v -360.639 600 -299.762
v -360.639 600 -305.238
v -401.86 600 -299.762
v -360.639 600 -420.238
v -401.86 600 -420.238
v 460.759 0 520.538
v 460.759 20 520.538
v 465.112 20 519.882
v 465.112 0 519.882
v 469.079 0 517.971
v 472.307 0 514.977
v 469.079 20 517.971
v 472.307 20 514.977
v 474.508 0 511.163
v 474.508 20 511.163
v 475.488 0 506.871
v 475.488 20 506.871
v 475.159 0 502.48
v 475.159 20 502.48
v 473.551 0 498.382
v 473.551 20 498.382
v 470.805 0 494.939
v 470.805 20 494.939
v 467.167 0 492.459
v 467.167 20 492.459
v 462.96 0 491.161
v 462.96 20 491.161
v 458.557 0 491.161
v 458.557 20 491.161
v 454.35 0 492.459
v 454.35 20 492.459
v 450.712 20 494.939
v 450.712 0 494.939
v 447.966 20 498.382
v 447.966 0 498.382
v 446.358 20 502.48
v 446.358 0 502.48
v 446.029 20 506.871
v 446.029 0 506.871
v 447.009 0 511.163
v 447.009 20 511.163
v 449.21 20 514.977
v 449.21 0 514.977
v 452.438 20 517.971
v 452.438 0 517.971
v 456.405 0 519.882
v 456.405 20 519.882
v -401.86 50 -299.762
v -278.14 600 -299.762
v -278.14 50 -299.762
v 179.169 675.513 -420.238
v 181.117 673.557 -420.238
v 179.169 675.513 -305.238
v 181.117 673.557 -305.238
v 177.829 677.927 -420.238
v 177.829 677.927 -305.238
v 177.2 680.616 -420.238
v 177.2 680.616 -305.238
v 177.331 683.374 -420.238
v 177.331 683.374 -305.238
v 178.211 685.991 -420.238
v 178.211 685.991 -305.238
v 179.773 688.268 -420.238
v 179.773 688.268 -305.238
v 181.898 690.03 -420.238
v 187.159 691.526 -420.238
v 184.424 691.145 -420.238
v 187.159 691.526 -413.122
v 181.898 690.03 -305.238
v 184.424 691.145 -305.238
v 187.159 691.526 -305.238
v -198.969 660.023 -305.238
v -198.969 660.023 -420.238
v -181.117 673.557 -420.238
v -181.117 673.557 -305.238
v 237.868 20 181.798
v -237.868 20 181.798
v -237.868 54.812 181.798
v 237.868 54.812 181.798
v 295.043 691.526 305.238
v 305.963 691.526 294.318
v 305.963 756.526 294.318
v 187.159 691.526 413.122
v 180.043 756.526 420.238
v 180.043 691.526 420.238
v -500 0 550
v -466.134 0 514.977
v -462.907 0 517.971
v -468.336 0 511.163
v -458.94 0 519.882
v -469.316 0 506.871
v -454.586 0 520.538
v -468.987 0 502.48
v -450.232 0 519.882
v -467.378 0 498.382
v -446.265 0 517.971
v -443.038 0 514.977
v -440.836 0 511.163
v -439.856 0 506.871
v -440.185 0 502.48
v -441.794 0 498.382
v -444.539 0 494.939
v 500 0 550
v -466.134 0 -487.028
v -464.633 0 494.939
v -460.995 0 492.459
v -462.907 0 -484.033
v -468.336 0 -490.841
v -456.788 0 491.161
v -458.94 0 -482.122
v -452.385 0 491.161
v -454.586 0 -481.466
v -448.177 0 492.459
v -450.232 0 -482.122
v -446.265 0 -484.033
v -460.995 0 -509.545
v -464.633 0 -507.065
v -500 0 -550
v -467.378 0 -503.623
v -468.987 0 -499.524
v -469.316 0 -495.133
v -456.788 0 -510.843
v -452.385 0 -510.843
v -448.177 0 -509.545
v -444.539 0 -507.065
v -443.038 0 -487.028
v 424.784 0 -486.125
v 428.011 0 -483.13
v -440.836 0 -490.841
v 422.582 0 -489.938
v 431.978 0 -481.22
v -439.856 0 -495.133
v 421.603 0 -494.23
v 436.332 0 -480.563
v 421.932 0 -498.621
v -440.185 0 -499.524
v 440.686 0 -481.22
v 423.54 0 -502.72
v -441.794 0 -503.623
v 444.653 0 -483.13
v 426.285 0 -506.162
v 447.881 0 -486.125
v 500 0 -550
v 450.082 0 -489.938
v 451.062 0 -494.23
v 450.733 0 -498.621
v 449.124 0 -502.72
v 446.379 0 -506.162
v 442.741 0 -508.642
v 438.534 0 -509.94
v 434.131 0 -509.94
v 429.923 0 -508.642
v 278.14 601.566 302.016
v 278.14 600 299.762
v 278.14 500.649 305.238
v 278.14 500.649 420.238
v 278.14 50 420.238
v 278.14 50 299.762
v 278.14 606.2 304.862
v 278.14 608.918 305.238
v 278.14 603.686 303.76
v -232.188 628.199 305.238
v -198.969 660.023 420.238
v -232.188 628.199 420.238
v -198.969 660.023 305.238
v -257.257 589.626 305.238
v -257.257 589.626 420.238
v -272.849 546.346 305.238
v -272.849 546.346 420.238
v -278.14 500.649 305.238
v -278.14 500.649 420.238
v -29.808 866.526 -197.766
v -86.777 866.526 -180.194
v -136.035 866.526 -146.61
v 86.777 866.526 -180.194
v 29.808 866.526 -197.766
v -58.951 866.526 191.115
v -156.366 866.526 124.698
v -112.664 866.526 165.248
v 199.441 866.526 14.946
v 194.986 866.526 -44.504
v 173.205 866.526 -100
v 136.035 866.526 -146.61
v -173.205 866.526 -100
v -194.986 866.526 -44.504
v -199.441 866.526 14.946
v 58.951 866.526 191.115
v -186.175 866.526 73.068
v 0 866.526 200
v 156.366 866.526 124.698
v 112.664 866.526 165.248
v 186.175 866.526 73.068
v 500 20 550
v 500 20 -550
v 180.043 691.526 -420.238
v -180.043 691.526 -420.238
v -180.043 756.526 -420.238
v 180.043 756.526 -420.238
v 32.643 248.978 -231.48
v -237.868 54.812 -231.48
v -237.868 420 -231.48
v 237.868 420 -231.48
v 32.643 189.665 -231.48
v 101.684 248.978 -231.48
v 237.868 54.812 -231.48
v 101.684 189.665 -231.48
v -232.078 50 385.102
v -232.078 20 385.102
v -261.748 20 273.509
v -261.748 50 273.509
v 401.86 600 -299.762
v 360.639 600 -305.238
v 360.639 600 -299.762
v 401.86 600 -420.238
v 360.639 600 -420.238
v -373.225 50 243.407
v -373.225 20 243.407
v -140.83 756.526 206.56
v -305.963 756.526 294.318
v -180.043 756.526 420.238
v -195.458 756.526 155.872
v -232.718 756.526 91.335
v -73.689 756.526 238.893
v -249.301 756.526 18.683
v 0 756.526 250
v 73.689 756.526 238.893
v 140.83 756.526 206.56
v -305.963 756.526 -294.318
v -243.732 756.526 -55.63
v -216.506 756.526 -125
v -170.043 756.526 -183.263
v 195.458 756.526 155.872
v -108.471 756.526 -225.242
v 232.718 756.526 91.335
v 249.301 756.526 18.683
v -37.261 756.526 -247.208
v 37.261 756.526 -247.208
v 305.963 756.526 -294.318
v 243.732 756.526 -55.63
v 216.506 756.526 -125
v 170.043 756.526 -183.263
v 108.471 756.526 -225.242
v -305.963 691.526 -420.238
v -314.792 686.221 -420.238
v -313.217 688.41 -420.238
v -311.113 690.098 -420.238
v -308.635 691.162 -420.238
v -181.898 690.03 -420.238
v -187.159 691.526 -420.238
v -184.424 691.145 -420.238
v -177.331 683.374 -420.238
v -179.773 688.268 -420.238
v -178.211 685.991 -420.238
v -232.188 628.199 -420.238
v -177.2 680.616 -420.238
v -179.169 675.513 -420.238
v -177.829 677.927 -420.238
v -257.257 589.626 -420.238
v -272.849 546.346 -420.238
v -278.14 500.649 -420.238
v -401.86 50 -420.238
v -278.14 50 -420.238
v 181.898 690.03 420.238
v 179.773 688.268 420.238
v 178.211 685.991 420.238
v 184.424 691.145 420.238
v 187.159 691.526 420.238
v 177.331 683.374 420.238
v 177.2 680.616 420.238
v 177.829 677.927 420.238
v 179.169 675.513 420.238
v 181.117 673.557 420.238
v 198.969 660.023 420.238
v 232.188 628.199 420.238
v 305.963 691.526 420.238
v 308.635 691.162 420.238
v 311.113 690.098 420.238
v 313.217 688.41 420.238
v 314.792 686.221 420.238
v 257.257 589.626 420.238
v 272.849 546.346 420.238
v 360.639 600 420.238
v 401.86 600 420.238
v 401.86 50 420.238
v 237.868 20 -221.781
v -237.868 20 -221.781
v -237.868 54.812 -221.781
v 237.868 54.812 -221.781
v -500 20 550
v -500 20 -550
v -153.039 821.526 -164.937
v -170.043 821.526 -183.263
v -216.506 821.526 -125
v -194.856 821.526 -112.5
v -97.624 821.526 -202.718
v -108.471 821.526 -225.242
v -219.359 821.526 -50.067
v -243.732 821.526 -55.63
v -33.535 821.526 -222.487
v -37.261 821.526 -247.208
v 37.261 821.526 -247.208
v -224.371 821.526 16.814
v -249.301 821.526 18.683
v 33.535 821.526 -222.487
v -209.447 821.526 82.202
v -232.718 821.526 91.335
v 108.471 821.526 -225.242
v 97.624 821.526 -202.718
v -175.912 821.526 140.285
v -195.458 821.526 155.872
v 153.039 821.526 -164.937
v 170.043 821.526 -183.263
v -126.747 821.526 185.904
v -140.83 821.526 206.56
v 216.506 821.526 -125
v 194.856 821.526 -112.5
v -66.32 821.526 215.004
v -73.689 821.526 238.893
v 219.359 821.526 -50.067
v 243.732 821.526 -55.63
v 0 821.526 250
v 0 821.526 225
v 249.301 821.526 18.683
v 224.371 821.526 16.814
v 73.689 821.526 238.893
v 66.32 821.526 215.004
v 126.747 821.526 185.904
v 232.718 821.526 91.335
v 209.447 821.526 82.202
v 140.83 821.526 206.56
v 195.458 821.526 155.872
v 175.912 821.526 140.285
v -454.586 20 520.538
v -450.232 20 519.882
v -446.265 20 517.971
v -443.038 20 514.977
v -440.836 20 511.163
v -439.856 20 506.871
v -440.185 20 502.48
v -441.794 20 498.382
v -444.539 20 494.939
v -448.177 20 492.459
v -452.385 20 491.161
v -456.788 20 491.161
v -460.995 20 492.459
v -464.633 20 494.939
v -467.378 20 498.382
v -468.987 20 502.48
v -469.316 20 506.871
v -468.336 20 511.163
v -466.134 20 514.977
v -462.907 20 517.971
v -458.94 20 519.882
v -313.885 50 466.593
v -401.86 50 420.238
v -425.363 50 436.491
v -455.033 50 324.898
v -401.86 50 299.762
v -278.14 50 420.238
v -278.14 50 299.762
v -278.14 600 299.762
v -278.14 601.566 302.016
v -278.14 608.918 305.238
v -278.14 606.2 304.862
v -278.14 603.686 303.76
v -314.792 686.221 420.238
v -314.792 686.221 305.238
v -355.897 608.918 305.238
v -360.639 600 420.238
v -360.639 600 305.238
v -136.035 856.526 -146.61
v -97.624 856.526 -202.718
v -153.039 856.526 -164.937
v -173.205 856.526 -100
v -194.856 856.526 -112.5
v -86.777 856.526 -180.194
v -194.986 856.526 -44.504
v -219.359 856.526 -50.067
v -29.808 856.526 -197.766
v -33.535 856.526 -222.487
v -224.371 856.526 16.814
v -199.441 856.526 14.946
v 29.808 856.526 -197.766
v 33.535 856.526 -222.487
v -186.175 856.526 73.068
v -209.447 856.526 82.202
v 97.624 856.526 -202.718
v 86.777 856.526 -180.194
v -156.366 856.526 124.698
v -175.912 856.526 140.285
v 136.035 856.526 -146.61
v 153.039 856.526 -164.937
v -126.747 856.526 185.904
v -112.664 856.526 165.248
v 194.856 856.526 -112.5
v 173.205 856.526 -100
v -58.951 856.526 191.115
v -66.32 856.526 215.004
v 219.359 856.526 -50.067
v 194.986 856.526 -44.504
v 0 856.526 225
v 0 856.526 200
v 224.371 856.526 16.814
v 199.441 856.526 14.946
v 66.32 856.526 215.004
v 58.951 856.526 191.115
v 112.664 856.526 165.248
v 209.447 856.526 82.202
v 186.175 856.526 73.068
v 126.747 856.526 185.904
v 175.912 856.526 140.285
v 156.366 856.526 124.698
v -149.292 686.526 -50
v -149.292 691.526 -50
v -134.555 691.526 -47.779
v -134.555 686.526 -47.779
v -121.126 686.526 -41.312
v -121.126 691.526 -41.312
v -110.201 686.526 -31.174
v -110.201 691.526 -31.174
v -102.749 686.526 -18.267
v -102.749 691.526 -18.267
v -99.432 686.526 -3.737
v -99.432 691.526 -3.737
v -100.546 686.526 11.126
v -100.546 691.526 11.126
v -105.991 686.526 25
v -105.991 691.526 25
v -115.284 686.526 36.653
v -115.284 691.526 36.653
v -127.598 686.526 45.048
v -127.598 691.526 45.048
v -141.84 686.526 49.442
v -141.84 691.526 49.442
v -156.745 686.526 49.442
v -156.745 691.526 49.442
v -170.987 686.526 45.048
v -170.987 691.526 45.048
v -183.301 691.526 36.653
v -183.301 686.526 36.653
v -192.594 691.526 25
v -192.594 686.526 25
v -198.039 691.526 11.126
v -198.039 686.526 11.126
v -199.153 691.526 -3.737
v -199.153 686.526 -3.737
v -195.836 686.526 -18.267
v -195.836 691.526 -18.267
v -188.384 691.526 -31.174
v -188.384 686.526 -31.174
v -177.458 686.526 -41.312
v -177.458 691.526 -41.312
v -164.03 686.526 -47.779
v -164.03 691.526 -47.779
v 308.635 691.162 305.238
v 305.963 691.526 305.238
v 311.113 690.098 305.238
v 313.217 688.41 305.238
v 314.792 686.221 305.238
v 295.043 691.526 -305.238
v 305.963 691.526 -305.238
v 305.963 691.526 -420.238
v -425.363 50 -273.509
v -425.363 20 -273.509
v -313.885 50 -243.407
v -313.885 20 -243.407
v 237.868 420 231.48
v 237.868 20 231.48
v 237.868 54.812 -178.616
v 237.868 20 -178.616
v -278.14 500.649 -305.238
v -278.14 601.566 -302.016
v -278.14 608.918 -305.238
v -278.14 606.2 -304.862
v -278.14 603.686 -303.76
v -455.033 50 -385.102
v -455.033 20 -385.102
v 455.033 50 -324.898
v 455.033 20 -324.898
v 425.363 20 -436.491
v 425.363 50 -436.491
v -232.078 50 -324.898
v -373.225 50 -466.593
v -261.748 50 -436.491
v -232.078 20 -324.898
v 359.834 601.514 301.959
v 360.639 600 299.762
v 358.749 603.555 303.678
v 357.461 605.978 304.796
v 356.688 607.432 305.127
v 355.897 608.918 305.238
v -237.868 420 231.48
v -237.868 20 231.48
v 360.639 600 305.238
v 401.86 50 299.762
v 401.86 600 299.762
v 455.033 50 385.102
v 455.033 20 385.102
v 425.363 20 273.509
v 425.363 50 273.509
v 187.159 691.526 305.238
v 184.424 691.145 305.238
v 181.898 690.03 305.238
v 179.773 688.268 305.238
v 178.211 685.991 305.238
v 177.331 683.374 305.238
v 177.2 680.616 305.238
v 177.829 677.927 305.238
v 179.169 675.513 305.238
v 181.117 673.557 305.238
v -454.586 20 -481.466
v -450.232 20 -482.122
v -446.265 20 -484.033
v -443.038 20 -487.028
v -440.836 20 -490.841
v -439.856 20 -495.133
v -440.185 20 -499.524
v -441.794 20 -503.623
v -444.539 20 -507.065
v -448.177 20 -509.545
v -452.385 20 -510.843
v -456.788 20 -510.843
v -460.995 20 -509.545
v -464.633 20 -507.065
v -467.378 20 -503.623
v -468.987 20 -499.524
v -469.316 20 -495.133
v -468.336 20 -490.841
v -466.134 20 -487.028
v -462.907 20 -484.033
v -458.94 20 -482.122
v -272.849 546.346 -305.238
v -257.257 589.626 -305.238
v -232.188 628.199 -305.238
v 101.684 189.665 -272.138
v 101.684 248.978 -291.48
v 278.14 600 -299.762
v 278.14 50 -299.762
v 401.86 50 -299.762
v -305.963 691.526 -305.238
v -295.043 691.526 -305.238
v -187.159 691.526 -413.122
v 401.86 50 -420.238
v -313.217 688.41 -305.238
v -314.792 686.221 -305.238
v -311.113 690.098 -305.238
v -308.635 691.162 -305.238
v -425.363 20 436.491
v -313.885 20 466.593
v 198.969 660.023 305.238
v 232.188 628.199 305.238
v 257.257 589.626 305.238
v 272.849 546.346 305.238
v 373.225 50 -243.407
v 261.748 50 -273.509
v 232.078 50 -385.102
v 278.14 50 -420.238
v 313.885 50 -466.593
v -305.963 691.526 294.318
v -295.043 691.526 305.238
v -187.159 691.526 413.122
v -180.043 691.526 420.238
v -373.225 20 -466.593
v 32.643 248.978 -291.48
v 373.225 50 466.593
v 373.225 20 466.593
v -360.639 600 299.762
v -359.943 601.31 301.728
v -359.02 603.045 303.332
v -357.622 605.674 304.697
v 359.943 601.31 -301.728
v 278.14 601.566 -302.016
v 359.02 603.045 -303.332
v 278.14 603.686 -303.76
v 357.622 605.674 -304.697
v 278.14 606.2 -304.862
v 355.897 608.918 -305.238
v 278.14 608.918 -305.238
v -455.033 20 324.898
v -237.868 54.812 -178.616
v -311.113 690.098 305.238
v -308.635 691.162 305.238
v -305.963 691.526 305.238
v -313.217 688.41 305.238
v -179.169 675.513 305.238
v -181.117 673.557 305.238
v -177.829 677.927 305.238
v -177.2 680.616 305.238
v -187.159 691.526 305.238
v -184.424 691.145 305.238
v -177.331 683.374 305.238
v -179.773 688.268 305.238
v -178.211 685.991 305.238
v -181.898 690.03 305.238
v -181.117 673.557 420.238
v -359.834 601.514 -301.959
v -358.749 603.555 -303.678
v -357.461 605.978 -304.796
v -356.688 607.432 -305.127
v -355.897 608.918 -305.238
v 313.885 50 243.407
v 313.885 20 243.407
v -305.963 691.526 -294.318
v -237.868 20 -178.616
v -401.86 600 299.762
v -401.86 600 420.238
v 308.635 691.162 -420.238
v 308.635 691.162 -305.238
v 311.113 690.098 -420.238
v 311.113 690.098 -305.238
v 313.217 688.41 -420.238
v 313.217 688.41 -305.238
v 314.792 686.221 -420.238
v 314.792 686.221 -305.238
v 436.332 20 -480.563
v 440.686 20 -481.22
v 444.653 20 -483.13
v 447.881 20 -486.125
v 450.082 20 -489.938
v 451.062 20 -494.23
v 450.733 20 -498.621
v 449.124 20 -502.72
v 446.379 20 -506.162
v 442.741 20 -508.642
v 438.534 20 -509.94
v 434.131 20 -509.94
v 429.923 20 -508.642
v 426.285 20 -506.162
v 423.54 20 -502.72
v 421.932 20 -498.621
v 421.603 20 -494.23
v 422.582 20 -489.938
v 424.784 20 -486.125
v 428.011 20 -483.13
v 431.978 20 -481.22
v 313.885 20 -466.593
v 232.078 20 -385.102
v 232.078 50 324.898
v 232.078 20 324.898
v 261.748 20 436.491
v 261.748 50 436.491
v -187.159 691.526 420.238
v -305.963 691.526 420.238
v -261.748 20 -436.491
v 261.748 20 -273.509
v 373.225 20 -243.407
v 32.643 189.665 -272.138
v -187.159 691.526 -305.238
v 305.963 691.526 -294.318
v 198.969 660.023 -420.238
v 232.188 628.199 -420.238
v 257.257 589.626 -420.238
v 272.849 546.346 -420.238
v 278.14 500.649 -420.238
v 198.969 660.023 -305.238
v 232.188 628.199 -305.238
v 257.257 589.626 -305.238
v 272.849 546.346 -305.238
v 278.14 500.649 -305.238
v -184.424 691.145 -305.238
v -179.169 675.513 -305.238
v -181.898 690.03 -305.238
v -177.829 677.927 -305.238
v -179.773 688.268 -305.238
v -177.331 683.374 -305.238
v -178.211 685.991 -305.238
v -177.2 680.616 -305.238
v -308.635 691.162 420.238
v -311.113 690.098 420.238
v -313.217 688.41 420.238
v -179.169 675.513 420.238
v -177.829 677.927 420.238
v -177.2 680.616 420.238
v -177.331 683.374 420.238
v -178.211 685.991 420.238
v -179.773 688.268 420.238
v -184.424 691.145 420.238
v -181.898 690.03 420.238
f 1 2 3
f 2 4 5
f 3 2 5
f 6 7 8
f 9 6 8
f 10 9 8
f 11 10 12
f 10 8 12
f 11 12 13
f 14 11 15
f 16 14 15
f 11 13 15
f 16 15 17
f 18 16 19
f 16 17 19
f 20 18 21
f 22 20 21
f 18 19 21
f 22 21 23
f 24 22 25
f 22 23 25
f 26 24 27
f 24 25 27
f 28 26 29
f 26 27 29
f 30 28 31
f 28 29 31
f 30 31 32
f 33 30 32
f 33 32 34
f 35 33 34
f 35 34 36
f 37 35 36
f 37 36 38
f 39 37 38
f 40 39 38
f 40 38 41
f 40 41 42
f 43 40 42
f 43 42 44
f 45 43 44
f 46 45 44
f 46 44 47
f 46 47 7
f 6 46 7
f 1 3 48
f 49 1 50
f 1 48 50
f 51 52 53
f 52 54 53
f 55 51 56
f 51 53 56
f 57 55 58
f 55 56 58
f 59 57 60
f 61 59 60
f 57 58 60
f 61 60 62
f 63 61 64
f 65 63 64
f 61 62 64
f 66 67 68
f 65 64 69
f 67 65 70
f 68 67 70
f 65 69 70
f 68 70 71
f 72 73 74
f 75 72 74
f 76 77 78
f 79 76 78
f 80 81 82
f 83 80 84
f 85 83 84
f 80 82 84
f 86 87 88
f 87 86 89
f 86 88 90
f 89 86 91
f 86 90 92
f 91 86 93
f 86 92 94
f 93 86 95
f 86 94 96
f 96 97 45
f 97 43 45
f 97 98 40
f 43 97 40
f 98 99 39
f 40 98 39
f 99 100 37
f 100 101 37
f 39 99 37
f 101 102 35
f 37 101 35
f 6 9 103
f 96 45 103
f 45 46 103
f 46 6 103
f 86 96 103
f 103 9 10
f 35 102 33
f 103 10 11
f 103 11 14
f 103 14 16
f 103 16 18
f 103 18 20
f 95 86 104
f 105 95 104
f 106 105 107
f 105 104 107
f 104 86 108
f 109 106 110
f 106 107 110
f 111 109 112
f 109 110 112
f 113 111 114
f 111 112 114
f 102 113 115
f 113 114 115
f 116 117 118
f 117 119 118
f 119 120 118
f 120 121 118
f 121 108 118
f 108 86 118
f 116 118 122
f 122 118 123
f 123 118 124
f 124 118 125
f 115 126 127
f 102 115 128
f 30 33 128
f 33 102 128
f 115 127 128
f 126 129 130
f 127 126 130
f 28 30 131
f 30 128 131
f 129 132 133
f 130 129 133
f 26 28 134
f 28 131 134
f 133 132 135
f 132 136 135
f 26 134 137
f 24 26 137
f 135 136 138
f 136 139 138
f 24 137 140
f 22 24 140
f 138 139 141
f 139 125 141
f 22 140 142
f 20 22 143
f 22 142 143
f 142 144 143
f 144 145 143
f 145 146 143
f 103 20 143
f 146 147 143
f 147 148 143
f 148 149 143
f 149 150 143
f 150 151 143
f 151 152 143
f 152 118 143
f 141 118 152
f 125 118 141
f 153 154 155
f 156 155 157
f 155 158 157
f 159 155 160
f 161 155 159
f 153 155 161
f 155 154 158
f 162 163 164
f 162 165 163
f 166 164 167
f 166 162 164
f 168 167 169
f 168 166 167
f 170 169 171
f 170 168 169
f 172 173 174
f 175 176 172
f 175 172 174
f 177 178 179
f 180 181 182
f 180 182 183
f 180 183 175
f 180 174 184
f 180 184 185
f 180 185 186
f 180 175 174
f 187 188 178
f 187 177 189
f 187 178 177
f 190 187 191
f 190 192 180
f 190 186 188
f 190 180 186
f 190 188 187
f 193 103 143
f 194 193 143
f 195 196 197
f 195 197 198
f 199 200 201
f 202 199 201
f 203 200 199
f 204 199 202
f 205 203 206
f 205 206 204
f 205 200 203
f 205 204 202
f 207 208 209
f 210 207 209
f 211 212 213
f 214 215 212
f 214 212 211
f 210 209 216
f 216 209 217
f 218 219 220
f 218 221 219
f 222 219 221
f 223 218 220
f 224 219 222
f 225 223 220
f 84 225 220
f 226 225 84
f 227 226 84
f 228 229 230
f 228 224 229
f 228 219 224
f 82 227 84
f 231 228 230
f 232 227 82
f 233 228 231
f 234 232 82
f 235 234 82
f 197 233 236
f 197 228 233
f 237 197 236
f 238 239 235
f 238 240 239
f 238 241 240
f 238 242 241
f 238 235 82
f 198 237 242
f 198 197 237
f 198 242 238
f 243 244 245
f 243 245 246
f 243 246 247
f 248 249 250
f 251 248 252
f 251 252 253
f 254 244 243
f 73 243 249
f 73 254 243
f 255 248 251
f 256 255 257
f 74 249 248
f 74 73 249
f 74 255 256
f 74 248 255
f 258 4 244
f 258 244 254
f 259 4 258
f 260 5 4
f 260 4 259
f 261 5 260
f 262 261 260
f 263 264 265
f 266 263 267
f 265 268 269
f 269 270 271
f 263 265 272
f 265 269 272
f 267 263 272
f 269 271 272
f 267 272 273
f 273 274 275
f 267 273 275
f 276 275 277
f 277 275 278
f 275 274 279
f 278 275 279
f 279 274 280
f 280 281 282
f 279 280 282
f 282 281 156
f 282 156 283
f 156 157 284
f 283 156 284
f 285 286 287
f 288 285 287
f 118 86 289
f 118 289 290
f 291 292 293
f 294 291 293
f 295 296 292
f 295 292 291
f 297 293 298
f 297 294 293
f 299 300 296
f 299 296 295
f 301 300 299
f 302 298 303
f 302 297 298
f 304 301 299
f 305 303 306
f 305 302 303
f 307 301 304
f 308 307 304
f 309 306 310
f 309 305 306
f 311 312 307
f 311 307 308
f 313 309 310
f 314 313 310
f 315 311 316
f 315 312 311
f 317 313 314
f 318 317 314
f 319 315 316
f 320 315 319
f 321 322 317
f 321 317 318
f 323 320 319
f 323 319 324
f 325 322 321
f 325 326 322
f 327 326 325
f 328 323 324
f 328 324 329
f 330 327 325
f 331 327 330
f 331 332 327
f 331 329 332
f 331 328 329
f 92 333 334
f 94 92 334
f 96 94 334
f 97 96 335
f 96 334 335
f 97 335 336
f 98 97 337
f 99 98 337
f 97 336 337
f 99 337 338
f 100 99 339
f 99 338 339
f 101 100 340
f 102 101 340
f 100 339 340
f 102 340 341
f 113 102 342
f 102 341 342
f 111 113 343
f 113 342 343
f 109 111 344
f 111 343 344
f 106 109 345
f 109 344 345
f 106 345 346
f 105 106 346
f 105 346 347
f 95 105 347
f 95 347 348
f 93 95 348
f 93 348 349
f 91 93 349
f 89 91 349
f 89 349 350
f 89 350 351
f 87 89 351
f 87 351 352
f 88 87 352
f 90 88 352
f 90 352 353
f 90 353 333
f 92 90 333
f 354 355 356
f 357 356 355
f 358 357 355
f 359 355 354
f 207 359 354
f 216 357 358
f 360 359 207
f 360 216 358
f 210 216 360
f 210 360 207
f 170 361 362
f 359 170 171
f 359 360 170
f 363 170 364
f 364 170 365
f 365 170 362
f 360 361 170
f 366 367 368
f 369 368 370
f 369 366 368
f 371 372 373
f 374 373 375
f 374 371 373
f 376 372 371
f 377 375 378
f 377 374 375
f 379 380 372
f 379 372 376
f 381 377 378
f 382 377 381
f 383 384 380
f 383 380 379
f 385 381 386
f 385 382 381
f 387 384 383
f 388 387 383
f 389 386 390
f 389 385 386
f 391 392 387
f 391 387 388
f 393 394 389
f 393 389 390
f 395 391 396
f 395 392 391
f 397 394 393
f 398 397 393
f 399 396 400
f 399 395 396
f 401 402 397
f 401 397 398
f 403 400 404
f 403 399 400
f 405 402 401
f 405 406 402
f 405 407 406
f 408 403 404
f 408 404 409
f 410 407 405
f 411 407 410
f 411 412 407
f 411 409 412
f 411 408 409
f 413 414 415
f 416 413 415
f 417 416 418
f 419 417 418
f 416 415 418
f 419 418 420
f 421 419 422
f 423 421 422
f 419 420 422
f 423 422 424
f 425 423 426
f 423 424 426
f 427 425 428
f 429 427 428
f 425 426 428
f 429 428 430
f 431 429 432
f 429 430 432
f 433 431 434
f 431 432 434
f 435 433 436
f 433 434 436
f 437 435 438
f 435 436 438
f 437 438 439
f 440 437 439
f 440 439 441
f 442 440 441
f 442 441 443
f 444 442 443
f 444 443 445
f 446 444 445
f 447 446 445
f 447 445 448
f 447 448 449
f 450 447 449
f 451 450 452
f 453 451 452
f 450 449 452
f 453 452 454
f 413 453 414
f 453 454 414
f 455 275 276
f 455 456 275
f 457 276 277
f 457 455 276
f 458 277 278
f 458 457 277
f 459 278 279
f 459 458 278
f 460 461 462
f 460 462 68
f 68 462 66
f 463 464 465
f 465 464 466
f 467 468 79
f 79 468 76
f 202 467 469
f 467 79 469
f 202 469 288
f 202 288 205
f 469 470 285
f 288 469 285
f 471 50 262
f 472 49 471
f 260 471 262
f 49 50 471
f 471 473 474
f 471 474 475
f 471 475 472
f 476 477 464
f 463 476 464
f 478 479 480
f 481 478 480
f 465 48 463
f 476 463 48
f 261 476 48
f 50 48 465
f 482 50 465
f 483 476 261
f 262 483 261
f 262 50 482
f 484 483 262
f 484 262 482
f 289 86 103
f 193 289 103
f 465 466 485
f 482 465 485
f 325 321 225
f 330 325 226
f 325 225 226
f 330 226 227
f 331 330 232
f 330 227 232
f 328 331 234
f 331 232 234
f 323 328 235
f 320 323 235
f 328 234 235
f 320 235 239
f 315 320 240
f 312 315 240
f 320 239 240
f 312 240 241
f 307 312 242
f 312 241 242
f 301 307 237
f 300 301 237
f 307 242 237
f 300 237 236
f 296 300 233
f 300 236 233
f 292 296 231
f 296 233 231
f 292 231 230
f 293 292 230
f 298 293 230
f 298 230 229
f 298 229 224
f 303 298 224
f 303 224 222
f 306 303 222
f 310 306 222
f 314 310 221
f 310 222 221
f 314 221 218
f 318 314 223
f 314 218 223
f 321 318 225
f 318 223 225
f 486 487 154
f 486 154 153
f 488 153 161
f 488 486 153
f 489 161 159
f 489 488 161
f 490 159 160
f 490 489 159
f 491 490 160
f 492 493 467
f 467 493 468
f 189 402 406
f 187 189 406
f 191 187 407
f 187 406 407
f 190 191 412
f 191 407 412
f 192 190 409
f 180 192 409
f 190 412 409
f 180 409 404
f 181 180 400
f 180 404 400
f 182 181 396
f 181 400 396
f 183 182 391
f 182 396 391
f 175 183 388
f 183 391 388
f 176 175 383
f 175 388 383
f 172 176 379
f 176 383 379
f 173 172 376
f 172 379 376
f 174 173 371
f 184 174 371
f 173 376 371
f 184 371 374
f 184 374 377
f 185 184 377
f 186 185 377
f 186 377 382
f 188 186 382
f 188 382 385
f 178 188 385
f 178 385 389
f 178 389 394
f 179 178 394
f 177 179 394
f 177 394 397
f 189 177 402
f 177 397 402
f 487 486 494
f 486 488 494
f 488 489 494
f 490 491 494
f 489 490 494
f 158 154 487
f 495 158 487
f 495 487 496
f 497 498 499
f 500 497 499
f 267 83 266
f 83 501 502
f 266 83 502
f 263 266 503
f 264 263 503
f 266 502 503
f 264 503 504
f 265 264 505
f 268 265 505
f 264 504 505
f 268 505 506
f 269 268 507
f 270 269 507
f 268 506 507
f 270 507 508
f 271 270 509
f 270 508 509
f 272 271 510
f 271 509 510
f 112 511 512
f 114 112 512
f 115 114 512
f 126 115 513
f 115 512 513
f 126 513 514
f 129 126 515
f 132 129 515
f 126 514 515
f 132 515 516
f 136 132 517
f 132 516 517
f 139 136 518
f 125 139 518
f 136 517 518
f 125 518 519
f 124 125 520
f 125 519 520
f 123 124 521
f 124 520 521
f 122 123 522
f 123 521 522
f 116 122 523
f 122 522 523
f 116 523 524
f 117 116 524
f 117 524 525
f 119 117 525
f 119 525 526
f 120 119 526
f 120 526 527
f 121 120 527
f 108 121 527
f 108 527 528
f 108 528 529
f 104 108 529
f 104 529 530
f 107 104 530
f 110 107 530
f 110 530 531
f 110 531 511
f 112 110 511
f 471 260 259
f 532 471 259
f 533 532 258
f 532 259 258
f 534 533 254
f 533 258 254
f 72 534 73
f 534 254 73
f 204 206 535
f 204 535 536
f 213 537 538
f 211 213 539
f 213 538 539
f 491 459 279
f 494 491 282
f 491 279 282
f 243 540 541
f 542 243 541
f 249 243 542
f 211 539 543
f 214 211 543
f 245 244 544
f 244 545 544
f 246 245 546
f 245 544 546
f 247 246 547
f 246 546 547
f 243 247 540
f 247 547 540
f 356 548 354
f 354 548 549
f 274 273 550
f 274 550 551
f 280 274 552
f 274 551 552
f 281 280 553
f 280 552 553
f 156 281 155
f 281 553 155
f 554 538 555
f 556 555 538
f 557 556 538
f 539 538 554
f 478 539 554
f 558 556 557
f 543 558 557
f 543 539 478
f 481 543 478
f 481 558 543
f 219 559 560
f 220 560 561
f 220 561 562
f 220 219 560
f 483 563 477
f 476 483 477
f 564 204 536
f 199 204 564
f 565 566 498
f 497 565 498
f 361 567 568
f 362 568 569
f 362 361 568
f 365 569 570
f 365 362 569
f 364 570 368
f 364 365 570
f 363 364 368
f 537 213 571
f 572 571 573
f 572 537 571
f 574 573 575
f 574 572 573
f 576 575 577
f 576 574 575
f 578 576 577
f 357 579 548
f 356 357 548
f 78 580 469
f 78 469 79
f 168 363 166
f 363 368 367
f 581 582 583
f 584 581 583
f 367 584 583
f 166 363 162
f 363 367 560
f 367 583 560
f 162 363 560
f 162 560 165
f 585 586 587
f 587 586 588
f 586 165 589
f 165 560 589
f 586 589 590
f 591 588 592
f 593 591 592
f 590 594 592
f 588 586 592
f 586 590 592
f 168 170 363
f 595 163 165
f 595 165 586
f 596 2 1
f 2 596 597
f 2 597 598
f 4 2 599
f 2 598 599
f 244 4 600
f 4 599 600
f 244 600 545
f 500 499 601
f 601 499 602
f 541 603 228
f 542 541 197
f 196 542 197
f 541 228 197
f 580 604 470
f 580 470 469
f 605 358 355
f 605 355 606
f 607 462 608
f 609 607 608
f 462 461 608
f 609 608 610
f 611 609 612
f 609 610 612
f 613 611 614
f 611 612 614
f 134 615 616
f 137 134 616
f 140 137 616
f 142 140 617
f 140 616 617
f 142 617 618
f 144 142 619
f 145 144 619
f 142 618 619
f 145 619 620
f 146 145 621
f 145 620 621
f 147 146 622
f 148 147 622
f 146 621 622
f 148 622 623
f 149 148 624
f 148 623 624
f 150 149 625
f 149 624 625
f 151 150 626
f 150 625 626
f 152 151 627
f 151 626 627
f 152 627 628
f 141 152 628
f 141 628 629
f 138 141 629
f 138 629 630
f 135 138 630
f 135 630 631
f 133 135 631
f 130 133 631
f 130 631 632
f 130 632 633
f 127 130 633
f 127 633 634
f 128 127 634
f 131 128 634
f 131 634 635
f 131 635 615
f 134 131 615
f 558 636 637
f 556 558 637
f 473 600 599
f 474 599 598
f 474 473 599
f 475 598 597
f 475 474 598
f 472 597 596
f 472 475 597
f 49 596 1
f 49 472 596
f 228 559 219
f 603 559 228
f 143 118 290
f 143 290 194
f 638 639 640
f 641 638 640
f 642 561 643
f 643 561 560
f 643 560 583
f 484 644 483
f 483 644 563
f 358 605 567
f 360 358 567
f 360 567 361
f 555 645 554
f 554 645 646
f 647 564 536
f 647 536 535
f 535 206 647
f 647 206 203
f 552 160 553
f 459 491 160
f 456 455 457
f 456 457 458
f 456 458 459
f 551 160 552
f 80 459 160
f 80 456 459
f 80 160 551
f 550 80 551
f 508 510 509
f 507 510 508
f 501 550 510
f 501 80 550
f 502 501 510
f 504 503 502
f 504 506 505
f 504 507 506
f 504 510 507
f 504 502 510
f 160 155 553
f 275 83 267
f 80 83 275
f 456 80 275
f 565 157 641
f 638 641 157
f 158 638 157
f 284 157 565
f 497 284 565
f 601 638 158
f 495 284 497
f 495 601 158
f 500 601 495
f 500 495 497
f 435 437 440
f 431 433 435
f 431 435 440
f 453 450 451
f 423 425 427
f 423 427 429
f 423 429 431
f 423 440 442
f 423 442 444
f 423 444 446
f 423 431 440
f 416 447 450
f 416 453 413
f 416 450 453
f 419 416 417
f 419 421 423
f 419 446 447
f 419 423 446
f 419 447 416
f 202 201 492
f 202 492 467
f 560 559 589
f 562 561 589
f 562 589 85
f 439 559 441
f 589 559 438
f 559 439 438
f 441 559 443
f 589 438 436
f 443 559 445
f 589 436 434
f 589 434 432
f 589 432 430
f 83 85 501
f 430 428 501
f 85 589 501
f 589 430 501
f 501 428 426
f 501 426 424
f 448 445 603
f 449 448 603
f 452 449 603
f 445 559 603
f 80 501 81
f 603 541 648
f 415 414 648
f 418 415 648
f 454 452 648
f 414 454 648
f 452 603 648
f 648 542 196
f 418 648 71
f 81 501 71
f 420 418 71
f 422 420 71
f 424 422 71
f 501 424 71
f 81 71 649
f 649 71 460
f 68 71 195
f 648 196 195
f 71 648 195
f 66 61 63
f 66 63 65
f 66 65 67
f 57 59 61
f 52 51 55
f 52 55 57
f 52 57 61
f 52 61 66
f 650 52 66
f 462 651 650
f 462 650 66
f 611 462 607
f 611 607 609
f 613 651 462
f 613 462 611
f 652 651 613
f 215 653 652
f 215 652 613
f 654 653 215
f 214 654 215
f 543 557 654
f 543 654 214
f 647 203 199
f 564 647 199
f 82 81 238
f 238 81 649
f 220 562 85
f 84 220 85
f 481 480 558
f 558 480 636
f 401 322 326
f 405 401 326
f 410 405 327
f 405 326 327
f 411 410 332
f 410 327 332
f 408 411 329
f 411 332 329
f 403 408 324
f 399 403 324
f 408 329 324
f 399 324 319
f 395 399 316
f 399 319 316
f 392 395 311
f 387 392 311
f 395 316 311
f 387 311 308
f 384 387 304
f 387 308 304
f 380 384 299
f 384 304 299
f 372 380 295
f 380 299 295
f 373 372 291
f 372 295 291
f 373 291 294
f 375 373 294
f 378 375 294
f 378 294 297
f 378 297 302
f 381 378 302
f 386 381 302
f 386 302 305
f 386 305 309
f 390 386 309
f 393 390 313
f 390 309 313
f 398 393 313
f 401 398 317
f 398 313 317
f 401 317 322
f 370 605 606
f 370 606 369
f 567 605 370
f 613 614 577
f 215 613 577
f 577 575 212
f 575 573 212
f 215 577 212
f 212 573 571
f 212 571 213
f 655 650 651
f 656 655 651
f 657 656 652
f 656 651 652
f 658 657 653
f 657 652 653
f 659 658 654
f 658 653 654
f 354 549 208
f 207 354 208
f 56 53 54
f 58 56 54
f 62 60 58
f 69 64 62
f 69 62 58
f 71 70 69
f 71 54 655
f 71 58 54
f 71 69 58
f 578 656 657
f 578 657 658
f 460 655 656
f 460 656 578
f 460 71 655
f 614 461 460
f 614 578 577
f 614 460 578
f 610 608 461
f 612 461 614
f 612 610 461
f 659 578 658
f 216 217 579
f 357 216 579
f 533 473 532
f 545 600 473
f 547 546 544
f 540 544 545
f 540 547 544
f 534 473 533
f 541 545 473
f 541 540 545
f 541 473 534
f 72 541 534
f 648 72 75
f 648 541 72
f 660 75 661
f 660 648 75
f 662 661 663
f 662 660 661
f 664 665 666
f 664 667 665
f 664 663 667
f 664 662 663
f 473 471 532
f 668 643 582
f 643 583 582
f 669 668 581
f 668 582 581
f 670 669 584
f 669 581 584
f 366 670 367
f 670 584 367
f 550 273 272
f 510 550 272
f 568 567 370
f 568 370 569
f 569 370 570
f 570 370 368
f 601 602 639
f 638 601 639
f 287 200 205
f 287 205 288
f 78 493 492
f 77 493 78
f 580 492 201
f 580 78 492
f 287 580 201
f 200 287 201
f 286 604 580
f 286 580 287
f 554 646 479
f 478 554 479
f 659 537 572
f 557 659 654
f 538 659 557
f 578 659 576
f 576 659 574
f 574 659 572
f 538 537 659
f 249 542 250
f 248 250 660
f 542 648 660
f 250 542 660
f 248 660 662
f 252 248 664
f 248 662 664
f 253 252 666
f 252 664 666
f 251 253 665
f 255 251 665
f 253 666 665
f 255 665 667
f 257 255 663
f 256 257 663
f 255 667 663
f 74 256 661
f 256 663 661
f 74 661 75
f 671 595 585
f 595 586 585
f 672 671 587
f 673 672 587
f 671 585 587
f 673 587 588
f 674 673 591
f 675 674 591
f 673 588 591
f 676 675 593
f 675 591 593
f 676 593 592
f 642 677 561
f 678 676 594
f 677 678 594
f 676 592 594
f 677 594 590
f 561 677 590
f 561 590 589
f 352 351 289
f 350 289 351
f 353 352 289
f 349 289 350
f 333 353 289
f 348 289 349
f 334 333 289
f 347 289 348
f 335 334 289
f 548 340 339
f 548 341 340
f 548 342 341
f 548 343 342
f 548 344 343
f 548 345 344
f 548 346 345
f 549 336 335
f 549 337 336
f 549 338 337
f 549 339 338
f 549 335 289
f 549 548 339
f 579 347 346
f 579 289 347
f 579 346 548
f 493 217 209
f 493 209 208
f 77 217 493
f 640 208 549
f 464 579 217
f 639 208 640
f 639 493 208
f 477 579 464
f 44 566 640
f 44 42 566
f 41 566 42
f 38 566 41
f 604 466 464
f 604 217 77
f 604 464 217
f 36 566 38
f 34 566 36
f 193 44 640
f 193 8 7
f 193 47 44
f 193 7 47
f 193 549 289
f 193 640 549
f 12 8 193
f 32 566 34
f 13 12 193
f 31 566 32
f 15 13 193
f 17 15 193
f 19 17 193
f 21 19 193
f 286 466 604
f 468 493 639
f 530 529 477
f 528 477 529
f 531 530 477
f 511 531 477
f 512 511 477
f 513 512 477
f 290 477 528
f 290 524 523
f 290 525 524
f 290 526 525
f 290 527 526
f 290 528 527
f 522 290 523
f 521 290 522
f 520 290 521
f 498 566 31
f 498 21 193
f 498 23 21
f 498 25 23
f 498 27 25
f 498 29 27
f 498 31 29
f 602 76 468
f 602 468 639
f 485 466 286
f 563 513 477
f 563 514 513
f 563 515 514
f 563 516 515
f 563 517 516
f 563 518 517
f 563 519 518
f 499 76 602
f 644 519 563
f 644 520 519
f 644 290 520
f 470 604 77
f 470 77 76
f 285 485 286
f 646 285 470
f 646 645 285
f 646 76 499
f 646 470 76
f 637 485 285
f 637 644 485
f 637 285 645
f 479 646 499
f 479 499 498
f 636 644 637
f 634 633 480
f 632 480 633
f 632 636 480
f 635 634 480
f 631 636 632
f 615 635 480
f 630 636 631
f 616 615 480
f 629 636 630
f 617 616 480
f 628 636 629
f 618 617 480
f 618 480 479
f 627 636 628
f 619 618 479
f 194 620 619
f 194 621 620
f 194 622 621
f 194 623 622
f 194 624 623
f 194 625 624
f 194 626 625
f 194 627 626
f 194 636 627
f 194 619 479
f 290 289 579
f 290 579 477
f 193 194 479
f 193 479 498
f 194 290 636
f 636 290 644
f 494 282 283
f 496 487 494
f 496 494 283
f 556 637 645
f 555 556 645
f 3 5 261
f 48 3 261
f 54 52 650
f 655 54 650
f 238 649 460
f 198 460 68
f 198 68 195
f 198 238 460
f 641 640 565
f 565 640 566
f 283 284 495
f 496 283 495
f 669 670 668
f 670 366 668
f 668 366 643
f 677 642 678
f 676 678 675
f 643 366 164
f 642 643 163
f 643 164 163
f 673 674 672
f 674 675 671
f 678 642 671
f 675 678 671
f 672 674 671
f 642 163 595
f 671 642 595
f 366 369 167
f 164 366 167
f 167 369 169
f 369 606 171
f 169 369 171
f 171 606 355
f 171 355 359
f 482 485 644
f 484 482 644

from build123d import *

# Parameters (mm, degrees)
SKETCH2_W            = 1000
SKETCH2_H            = 1100
BOSS_EXTRUDE1_DEPTH  = 20
BOSS_EXTRUDE2_DEPTH  = 30
SKETCH4_W            = 475.735232804
SKETCH4_H            = 462.959293972
BOSS_EXTRUDE3_DEPTH  = 400
SKETCH5_W            = 9.698613805
SKETCH5_H            = 34.812032077
CUT_EXTRUDE1_DEPTH   = 1012.606949035
SKETCH6_W            = 360.413866027
SKETCH6_H            = 34.812032077
CUT_EXTRUDE2_DEPTH   = 1012.606949035
SKETCH7_W            = 115
SKETCH7_H            = 115
BOSS_EXTRUDE4_DEPTH  = 550
BOSS_EXTRUDE6_DEPTH  = 115
FILLET3_R            = 200
FILLET5_R            = 10
FILLET6_R            = 10
FILLET3_OF_MIRROR2_R = 200
MIRROR3_START        = -420.238334409
MIRROR3_DEPTH        = 115
MIRROR3_START_2      = 299.761665591
MIRROR3_2_OUTLINE_W  = 123.720887542
MIRROR3_2_OUTLINE_H  = 550
MIRROR3_2_DEPTH      = 5.476668818
FILLET9_R            = 10
FILLET11_R           = 10
FILLET13_R           = 10
FILLET15_R           = 10
FILLET16_R           = 10
SKETCH9_W            = 611.925919606
SKETCH9_H            = 840.476668818
BOSS_EXTRUDE7_DEPTH  = 65
CUT_EXTRUDE3_DEPTH   = 65
SKETCH13_R           = 250
BOSS_EXTRUDE8_DEPTH  = 65
SKETCH14_R           = 225
BOSS_EXTRUDE9_DEPTH  = 35
SKETCH15_R           = 200
BOSS_EXTRUDE10_DEPTH = 10
SKETCH16_R           = 50
BOSS_EXTRUDE11_DEPTH = 5
SKETCH17_W           = 69.041025083
SKETCH17_H           = 59.313575352
BOSS_EXTRUDE12_DEPTH = 60
CUT_EXTRUDE4_DEPTH   = 90
SKETCH19_R           = 14.770979528
CUT_EXTRUDE5_DEPTH   = 90


# Read off the part's stored shape, not the designer's step: Mirror3
with BuildPart() as part:
    # Sketch2 → Boss-Extrude1 (new body)
    with BuildSketch(Plane(origin=(0, 0, 0), x_dir=(1, 0, 0), z_dir=(0, 1, 0))):
        Rectangle(SKETCH2_W, SKETCH2_H)
    extrude(amount=BOSS_EXTRUDE1_DEPTH)

    # Sketch3 → Boss-Extrude2 (add)
    with BuildSketch(Plane(origin=(0, 20, 0), x_dir=(1, 0, 0), z_dir=(0, 1, 0))):
        Polygon((-232.077673929, 324.898305528), (-261.747565619, 436.491454334), (-373.225013219, 466.593148806), (-455.032569128, 385.101694472), (-425.362677437, 273.508545666), (-313.885229838, 243.406851194), align=None)
        Polygon((-455.032569128, -324.898305528), (-425.362677437, -436.491454334), (-313.885229838, -466.593148806), (-232.077673929, -385.101694472), (-261.747565619, -273.508545666), (-373.225013219, -243.406851194), align=None)
        Polygon((261.747565619, -436.491454334), (373.225013219, -466.593148806), (455.032569128, -385.101694472), (425.362677437, -273.508545666), (313.885229838, -243.406851194), (232.077673929, -324.898305528), align=None)
        Polygon((261.747565619, 273.508545666), (373.225013219, 243.406851194), (455.032569128, 324.898305528), (425.362677437, 436.491454334), (313.885229838, 466.593148806), (232.077673929, 385.101694472), align=None)
    extrude(amount=BOSS_EXTRUDE2_DEPTH)

    # Sketch4 → Boss-Extrude3 (add)
    with BuildSketch(Plane(origin=(0, 20, 0), x_dir=(1, 0, 0), z_dir=(0, 1, 0))):
        Rectangle(SKETCH4_W, SKETCH4_H)
    extrude(amount=BOSS_EXTRUDE3_DEPTH)

    # Sketch5 → Cut-Extrude1 (cut, through all)
    with BuildSketch(Plane.ZY.offset(237.867616402)):
        with Locations((-226.630340084, 37.406016038)):
            Rectangle(SKETCH5_W, SKETCH5_H)
    extrude(amount=-CUT_EXTRUDE1_DEPTH, mode=Mode.SUBTRACT)

    # Sketch6 → Cut-Extrude2 (cut, through all)
    with BuildSketch(Plane.ZY.offset(237.867616402)):
        with Locations((1.590947851, 37.406016038)):
            Rectangle(SKETCH6_W, SKETCH6_H)
    extrude(amount=-CUT_EXTRUDE2_DEPTH, mode=Mode.SUBTRACT)

    # Sketch7 → Boss-Extrude4 (add)
    with BuildSketch(Plane(origin=(0, 50, 0), x_dir=(1, 0, 0), z_dir=(0, 1, 0))):
        with Locations((-335.639556229, 357.261665591)):
            Rectangle(SKETCH7_W, SKETCH7_H)
        with Locations((344.360443771, 357.261665591)):
            Rectangle(SKETCH7_W, SKETCH7_H)
        with Locations((-335.639556229, -362.738334409)):
            Rectangle(SKETCH7_W, SKETCH7_H)
        with Locations((344.360443771, -362.738334409)):
            Rectangle(SKETCH7_W, SKETCH7_H)
    boss_extrude4 = extrude(amount=BOSS_EXTRUDE4_DEPTH)

    # Sketch8 → Boss-Extrude6 (add)
    with BuildSketch(Plane.XY.offset(420.238334409)):
        Polygon((-311.971408496, 691.526051238), (-360.639390354, 600), (-278.139556229, 600), (-157.416765755, 691.526051238), align=None)
    boss_extrude6 = extrude(amount=-BOSS_EXTRUDE6_DEPTH)

    # Fillet3
    fillet3_edges = [part.edges().sort_by_distance(p)[0] for p in [
        (-278.139556229, 600, 362.738334409),
    ]]
    fillet(fillet3_edges, radius=FILLET3_R)

    # Fillet5
    fillet5_edges = [part.edges().sort_by_distance(p)[0] for p in [
        (-157.416765755, 691.526051238, 362.738334409),
    ]]
    fillet(fillet5_edges, radius=FILLET5_R)

    # Fillet6
    fillet6_edges = [part.edges().sort_by_distance(p)[0] for p in [
        (-311.971408496, 691.526051238, 362.738334409),
    ]]
    fillet(fillet6_edges, radius=FILLET6_R)

    # Mirror2: Boss-Extrude4, Boss-Extrude6 across plane
    add(boss_extrude4.mirror(Plane(origin=(0, 0, 0), x_dir=(0, 0, 1), z_dir=(1, 0, 0))))
    add(boss_extrude6.mirror(Plane(origin=(0, 0, 0), x_dir=(0, 0, 1), z_dir=(1, 0, 0))))

    # Fillet3 of Mirror2
    fillet3_of_mirror2_edges = [part.edges().sort_by_distance(p)[0] for p in [
        (278.139556229, 600, 362.738334409),
    ]]
    fillet(fillet3_of_mirror2_edges, radius=FILLET3_OF_MIRROR2_R)

    # Mirror3 outline → Mirror3 (add)
    with BuildSketch(Plane.XY.offset(MIRROR3_START)):
        with BuildLine():
            Line((-278.139556229, 50), (-278.139556229, 500.648656801))
            ThreePointArc((-278.139556229, 500.648656801), (-257.256761918, 589.626331677), (-198.969289966, 660.022981726))
            Line((-198.969289966, 660.022981726), (-157.416765755, 691.526051238))
            Line((-157.416765755, 691.526051238), (-311.971408496, 691.526051238))
            Line((-311.971408496, 691.526051238), (-360.639390354, 600))
            Line((-360.639390354, 600), (-401.860443771, 600))
            Line((-401.860443771, 600), (-401.860443771, 50))
            Line((-401.860443771, 50), (-278.139556229, 50))
        make_face()
        with BuildLine():
            Line((401.860443771, 50), (401.860443771, 600))
            Line((401.860443771, 600), (360.639390354, 600))
            Line((360.639390354, 600), (311.971408496, 691.526051238))
            Line((311.971408496, 691.526051238), (157.416765755, 691.526051238))
            Line((157.416765755, 691.526051238), (198.969289966, 660.022981726))
            ThreePointArc((198.969289966, 660.022981726), (257.256761918, 589.626331677), (278.139556229, 500.648656801))
            Line((278.139556229, 500.648656801), (278.139556229, 50))
            Line((278.139556229, 50), (401.860443771, 50))
        make_face()
    extrude(amount=MIRROR3_DEPTH)

    # Mirror3 2 outline → Mirror3 2 (add)
    with BuildSketch(Plane.XY.offset(MIRROR3_START_2)):
        with Locations((-340, 325)):
            Rectangle(MIRROR3_2_OUTLINE_W, MIRROR3_2_OUTLINE_H)
        with Locations((340, 325)):
            Rectangle(MIRROR3_2_OUTLINE_W, MIRROR3_2_OUTLINE_H)
    extrude(amount=MIRROR3_2_DEPTH)

    # Fillet9
    # the kernel refuses this fillet: 10 mm, written as the material it adds along each edge
    with BuildSketch(Plane(origin=(-278.139556229, 600, -305.238334409), x_dir=(0, 0, 1), z_dir=(-1, 0, 0))) as fillet9_piece_1_section:
        with BuildLine():
            CenterArc((10, 8.918490625), FILLET9_R, 180, 63.10652679)
            Line((0, 8.918490625), (-0.2, 8.918490625))
            Line((-0.2, 8.918490625), (-0.2, 0))
            Line((-0.2, 0), (0, -0.2))
            ThreePointArc((0, -0.2), (2.738334409, -0.2), (5.386202195, -0.178369812))
            Line((5.386202195, -0.178369812), (5.476668818, 0))
        make_face()
    fillet9_piece_1 = extrude(amount=104.796060686, mode=Mode.PRIVATE)
    fillet9_piece_1 = split(fillet9_piece_1, bisect_by=Plane(origin=(-350.518364197, 619.033819017, -303.80875695), z_dir=(0.882936727210202, -0.46949199752853876, 0)), keep=Keep.TOP, mode=Mode.PRIVATE)
    add(fillet9_piece_1)

    # Fillet11
    # the kernel refuses this fillet: 10 mm, written as the material it adds along each edge
    with BuildSketch(Plane(origin=(-278.139556229, 600, 305.238334409), x_dir=(0, 0, -1), z_dir=(-1, 0, 0))) as fillet11_piece_1_section:
        with BuildLine():
            CenterArc((10, -8.918490625), FILLET11_R, 116.89347321, 63.10652679)
            Line((0, -8.918490625), (-0.2, -8.918490625))
            Line((-0.2, -8.918490625), (-0.2, 0))
            Line((-0.2, 0), (0, 0.2))
            ThreePointArc((0, 0.2), (2.738334409, 0.2), (5.386202194, 0.178369812))
            Line((5.386202194, 0.178369812), (5.476668818, 0))
        make_face()
    fillet11_piece_1 = extrude(amount=104.796060686, mode=Mode.PRIVATE)
    fillet11_piece_1 = split(fillet11_piece_1, bisect_by=Plane(origin=(-350.518364197, 619.033819017, 303.80875695), z_dir=(0.8829367272129939, -0.4694919975232882, 0)), keep=Keep.TOP, mode=Mode.PRIVATE)
    add(fillet11_piece_1)

    # Fillet13
    # the kernel refuses this fillet: 10 mm, written as the material it adds along each edge
    with BuildSketch(Plane(origin=(278.139556229, 600, -305.238334409), x_dir=(0, 1, 0), z_dir=(1, 0, 0))) as fillet13_piece_1_section:
        with BuildLine():
            CenterArc((8.918490625, 10), FILLET13_R, 206.89347321, 63.10652679)
            Line((0, 5.476668818), (-0.178369812, 5.386202195))
            ThreePointArc((-0.178369812, 5.386202195), (-0.2, 2.738334409), (-0.2, 0))
            Line((-0.2, 0), (0, -0.2))
            Line((0, -0.2), (8.918490625, -0.2))
            Line((8.918490625, -0.2), (8.918490625, 0))
        make_face()
    fillet13_piece_1 = extrude(amount=104.796060686, mode=Mode.PRIVATE)
    fillet13_piece_1 = split(fillet13_piece_1, bisect_by=Plane(origin=(350.518364197, 619.033819017, -303.80875695), z_dir=(-0.882936727210202, -0.46949199752853876, 0)), keep=Keep.TOP, mode=Mode.PRIVATE)
    add(fillet13_piece_1)

    # Fillet15
    # the kernel refuses this fillet: 10 mm, written as the material it adds along each edge
    with BuildSketch(Plane(origin=(382.935616915, 600, 305.238334409), x_dir=(0, 0, -1), z_dir=(-1, 0, 0))) as fillet15_piece_1_section:
        with BuildLine():
            CenterArc((10, -8.918490625), FILLET15_R, 116.89347321, 63.10652679)
            Line((0, -8.918490625), (-0.2, -8.918490625))
            Line((-0.2, -8.918490625), (-0.2, 0))
            Line((-0.2, 0), (0, 0.2))
            ThreePointArc((0, 0.2), (2.738334409, 0.2), (5.386202195, 0.178369812))
            Line((5.386202195, 0.178369812), (5.476668818, 0))
        make_face()
    fillet15_piece_1 = extrude(amount=104.796060686, mode=Mode.PRIVATE)
    fillet15_piece_1 = split(fillet15_piece_1, bisect_by=Plane(origin=(350.518364197, 619.033819017, 303.80875695), z_dir=(-0.8829367272129939, -0.4694919975232882, 0)), keep=Keep.TOP, mode=Mode.PRIVATE)
    add(fillet15_piece_1)

    # Fillet16
    fillet16_edges = [part.edges().sort_by_distance(p)[0] for p in [
        (157.416765755, 691.526051238, 362.738334409),
        (311.971408496, 691.526051238, 362.738334409),
        (157.416765755, 691.526051238, -362.738334409),
        (311.971408496, 691.526051238, -362.738334409),
        (-157.416765755, 691.526051238, -362.738334409),
        (-311.971408496, 691.526051238, -362.738334409),
    ]]
    fillet(fillet16_edges, radius=FILLET16_R)

    # Sketch9 → Boss-Extrude7 (add)
    with BuildSketch(Plane(origin=(0, 691.526051238, 0), x_dir=(1, 0, 0), z_dir=(0, 1, 0))):
        Rectangle(SKETCH9_W, SKETCH9_H)
    extrude(amount=BOSS_EXTRUDE7_DEPTH)

    # Sketch12 → Cut-Extrude3 (cut)
    with BuildSketch(Plane(origin=(0, 756.526051238, 0), x_dir=(1, 0, 0), z_dir=(0, 1, 0))):
        Polygon((-305.962959803, -420.238334409), (-305.962959803, -294.318020805), (-180.042646199, -420.238334409), align=None)
        Polygon((180.042646199, 420.238334409), (305.962959803, 420.238334409), (305.962959803, 294.318020805), align=None)
        Polygon((-305.962959803, 294.318020805), (-180.042646199, 420.238334409), (-305.962959803, 420.238334409), align=None)
        Polygon((305.962959803, -294.318020805), (180.042646199, -420.238334409), (305.962959803, -420.238334409), align=None)
    extrude(amount=-CUT_EXTRUDE3_DEPTH, mode=Mode.SUBTRACT)

    # Sketch13 → Boss-Extrude8 (add)
    with BuildSketch(Plane(origin=(0, 756.526051238, 0), x_dir=(1, 0, 0), z_dir=(0, 1, 0))):
        with Locations(Location((0, 0, 0), (0, 0, 270))):
            Circle(SKETCH13_R)
    extrude(amount=BOSS_EXTRUDE8_DEPTH)

    # Sketch14 → Boss-Extrude9 (add)
    with BuildSketch(Plane(origin=(0, 821.526051238, 0), x_dir=(1, 0, 0), z_dir=(0, 1, 0))):
        with Locations(Location((0, 0, 0), (0, 0, 270))):
            Circle(SKETCH14_R)
    extrude(amount=BOSS_EXTRUDE9_DEPTH)

    # Sketch15 → Boss-Extrude10 (add)
    with BuildSketch(Plane(origin=(0, 856.526051238, 0), x_dir=(1, 0, 0), z_dir=(0, 1, 0))):
        with Locations(Location((0, 0, 0), (0, 0, 270))):
            Circle(SKETCH15_R)
    extrude(amount=BOSS_EXTRUDE10_DEPTH)

    # Sketch16 → Boss-Extrude11 (add)
    with BuildSketch(Plane.XZ.offset(-691.526051238)):
        with Locations(Location((-149.292458402, 0, 0), (0, 0, 270))):
            Circle(SKETCH16_R)
    extrude(amount=BOSS_EXTRUDE11_DEPTH)

    # Sketch17 → Boss-Extrude12 (add)
    with BuildSketch(Plane(origin=(0, 0, -231.479646986), x_dir=(-1, 0, 0), z_dir=(0, 0, -1))):
        with Locations((-67.163178289, 219.321580657)):
            Rectangle(SKETCH17_W, SKETCH17_H)
    extrude(amount=BOSS_EXTRUDE12_DEPTH)

    # Sketch18 → Cut-Extrude4 (cut)
    with BuildSketch(Plane(origin=(101.683690831, 0, 0), x_dir=(0, 0, -1), z_dir=(1, 0, 0))):
        Polygon((291.479646986, 248.978368333), (272.137715086, 189.664792981), (291.479646986, 189.664792981), align=None)
    extrude(amount=-CUT_EXTRUDE4_DEPTH, mode=Mode.SUBTRACT)

    # Sketch19 → Cut-Extrude5 (cut)
    with BuildSketch(Plane(origin=(0, 20, 0), x_dir=(1, 0, 0), z_dir=(0, 1, 0))):
        with Locations(Location((436.332182741, 495.334248605, 0), (0, 0, 270))):
            Circle(SKETCH19_R)
        with Locations(Location((-454.586016885, 496.237081752, 0), (0, 0, 270))):
            Circle(SKETCH19_R)
        with Locations(Location((-454.586016885, -505.767019401, 0), (0, 0, 270))):
            Circle(SKETCH19_R)
        with Locations(Location((460.758535381, -505.767019401, 0), (0, 0, 270))):
            Circle(SKETCH19_R)
    extrude(amount=-CUT_EXTRUDE5_DEPTH, mode=Mode.SUBTRACT)


solid = part.part
